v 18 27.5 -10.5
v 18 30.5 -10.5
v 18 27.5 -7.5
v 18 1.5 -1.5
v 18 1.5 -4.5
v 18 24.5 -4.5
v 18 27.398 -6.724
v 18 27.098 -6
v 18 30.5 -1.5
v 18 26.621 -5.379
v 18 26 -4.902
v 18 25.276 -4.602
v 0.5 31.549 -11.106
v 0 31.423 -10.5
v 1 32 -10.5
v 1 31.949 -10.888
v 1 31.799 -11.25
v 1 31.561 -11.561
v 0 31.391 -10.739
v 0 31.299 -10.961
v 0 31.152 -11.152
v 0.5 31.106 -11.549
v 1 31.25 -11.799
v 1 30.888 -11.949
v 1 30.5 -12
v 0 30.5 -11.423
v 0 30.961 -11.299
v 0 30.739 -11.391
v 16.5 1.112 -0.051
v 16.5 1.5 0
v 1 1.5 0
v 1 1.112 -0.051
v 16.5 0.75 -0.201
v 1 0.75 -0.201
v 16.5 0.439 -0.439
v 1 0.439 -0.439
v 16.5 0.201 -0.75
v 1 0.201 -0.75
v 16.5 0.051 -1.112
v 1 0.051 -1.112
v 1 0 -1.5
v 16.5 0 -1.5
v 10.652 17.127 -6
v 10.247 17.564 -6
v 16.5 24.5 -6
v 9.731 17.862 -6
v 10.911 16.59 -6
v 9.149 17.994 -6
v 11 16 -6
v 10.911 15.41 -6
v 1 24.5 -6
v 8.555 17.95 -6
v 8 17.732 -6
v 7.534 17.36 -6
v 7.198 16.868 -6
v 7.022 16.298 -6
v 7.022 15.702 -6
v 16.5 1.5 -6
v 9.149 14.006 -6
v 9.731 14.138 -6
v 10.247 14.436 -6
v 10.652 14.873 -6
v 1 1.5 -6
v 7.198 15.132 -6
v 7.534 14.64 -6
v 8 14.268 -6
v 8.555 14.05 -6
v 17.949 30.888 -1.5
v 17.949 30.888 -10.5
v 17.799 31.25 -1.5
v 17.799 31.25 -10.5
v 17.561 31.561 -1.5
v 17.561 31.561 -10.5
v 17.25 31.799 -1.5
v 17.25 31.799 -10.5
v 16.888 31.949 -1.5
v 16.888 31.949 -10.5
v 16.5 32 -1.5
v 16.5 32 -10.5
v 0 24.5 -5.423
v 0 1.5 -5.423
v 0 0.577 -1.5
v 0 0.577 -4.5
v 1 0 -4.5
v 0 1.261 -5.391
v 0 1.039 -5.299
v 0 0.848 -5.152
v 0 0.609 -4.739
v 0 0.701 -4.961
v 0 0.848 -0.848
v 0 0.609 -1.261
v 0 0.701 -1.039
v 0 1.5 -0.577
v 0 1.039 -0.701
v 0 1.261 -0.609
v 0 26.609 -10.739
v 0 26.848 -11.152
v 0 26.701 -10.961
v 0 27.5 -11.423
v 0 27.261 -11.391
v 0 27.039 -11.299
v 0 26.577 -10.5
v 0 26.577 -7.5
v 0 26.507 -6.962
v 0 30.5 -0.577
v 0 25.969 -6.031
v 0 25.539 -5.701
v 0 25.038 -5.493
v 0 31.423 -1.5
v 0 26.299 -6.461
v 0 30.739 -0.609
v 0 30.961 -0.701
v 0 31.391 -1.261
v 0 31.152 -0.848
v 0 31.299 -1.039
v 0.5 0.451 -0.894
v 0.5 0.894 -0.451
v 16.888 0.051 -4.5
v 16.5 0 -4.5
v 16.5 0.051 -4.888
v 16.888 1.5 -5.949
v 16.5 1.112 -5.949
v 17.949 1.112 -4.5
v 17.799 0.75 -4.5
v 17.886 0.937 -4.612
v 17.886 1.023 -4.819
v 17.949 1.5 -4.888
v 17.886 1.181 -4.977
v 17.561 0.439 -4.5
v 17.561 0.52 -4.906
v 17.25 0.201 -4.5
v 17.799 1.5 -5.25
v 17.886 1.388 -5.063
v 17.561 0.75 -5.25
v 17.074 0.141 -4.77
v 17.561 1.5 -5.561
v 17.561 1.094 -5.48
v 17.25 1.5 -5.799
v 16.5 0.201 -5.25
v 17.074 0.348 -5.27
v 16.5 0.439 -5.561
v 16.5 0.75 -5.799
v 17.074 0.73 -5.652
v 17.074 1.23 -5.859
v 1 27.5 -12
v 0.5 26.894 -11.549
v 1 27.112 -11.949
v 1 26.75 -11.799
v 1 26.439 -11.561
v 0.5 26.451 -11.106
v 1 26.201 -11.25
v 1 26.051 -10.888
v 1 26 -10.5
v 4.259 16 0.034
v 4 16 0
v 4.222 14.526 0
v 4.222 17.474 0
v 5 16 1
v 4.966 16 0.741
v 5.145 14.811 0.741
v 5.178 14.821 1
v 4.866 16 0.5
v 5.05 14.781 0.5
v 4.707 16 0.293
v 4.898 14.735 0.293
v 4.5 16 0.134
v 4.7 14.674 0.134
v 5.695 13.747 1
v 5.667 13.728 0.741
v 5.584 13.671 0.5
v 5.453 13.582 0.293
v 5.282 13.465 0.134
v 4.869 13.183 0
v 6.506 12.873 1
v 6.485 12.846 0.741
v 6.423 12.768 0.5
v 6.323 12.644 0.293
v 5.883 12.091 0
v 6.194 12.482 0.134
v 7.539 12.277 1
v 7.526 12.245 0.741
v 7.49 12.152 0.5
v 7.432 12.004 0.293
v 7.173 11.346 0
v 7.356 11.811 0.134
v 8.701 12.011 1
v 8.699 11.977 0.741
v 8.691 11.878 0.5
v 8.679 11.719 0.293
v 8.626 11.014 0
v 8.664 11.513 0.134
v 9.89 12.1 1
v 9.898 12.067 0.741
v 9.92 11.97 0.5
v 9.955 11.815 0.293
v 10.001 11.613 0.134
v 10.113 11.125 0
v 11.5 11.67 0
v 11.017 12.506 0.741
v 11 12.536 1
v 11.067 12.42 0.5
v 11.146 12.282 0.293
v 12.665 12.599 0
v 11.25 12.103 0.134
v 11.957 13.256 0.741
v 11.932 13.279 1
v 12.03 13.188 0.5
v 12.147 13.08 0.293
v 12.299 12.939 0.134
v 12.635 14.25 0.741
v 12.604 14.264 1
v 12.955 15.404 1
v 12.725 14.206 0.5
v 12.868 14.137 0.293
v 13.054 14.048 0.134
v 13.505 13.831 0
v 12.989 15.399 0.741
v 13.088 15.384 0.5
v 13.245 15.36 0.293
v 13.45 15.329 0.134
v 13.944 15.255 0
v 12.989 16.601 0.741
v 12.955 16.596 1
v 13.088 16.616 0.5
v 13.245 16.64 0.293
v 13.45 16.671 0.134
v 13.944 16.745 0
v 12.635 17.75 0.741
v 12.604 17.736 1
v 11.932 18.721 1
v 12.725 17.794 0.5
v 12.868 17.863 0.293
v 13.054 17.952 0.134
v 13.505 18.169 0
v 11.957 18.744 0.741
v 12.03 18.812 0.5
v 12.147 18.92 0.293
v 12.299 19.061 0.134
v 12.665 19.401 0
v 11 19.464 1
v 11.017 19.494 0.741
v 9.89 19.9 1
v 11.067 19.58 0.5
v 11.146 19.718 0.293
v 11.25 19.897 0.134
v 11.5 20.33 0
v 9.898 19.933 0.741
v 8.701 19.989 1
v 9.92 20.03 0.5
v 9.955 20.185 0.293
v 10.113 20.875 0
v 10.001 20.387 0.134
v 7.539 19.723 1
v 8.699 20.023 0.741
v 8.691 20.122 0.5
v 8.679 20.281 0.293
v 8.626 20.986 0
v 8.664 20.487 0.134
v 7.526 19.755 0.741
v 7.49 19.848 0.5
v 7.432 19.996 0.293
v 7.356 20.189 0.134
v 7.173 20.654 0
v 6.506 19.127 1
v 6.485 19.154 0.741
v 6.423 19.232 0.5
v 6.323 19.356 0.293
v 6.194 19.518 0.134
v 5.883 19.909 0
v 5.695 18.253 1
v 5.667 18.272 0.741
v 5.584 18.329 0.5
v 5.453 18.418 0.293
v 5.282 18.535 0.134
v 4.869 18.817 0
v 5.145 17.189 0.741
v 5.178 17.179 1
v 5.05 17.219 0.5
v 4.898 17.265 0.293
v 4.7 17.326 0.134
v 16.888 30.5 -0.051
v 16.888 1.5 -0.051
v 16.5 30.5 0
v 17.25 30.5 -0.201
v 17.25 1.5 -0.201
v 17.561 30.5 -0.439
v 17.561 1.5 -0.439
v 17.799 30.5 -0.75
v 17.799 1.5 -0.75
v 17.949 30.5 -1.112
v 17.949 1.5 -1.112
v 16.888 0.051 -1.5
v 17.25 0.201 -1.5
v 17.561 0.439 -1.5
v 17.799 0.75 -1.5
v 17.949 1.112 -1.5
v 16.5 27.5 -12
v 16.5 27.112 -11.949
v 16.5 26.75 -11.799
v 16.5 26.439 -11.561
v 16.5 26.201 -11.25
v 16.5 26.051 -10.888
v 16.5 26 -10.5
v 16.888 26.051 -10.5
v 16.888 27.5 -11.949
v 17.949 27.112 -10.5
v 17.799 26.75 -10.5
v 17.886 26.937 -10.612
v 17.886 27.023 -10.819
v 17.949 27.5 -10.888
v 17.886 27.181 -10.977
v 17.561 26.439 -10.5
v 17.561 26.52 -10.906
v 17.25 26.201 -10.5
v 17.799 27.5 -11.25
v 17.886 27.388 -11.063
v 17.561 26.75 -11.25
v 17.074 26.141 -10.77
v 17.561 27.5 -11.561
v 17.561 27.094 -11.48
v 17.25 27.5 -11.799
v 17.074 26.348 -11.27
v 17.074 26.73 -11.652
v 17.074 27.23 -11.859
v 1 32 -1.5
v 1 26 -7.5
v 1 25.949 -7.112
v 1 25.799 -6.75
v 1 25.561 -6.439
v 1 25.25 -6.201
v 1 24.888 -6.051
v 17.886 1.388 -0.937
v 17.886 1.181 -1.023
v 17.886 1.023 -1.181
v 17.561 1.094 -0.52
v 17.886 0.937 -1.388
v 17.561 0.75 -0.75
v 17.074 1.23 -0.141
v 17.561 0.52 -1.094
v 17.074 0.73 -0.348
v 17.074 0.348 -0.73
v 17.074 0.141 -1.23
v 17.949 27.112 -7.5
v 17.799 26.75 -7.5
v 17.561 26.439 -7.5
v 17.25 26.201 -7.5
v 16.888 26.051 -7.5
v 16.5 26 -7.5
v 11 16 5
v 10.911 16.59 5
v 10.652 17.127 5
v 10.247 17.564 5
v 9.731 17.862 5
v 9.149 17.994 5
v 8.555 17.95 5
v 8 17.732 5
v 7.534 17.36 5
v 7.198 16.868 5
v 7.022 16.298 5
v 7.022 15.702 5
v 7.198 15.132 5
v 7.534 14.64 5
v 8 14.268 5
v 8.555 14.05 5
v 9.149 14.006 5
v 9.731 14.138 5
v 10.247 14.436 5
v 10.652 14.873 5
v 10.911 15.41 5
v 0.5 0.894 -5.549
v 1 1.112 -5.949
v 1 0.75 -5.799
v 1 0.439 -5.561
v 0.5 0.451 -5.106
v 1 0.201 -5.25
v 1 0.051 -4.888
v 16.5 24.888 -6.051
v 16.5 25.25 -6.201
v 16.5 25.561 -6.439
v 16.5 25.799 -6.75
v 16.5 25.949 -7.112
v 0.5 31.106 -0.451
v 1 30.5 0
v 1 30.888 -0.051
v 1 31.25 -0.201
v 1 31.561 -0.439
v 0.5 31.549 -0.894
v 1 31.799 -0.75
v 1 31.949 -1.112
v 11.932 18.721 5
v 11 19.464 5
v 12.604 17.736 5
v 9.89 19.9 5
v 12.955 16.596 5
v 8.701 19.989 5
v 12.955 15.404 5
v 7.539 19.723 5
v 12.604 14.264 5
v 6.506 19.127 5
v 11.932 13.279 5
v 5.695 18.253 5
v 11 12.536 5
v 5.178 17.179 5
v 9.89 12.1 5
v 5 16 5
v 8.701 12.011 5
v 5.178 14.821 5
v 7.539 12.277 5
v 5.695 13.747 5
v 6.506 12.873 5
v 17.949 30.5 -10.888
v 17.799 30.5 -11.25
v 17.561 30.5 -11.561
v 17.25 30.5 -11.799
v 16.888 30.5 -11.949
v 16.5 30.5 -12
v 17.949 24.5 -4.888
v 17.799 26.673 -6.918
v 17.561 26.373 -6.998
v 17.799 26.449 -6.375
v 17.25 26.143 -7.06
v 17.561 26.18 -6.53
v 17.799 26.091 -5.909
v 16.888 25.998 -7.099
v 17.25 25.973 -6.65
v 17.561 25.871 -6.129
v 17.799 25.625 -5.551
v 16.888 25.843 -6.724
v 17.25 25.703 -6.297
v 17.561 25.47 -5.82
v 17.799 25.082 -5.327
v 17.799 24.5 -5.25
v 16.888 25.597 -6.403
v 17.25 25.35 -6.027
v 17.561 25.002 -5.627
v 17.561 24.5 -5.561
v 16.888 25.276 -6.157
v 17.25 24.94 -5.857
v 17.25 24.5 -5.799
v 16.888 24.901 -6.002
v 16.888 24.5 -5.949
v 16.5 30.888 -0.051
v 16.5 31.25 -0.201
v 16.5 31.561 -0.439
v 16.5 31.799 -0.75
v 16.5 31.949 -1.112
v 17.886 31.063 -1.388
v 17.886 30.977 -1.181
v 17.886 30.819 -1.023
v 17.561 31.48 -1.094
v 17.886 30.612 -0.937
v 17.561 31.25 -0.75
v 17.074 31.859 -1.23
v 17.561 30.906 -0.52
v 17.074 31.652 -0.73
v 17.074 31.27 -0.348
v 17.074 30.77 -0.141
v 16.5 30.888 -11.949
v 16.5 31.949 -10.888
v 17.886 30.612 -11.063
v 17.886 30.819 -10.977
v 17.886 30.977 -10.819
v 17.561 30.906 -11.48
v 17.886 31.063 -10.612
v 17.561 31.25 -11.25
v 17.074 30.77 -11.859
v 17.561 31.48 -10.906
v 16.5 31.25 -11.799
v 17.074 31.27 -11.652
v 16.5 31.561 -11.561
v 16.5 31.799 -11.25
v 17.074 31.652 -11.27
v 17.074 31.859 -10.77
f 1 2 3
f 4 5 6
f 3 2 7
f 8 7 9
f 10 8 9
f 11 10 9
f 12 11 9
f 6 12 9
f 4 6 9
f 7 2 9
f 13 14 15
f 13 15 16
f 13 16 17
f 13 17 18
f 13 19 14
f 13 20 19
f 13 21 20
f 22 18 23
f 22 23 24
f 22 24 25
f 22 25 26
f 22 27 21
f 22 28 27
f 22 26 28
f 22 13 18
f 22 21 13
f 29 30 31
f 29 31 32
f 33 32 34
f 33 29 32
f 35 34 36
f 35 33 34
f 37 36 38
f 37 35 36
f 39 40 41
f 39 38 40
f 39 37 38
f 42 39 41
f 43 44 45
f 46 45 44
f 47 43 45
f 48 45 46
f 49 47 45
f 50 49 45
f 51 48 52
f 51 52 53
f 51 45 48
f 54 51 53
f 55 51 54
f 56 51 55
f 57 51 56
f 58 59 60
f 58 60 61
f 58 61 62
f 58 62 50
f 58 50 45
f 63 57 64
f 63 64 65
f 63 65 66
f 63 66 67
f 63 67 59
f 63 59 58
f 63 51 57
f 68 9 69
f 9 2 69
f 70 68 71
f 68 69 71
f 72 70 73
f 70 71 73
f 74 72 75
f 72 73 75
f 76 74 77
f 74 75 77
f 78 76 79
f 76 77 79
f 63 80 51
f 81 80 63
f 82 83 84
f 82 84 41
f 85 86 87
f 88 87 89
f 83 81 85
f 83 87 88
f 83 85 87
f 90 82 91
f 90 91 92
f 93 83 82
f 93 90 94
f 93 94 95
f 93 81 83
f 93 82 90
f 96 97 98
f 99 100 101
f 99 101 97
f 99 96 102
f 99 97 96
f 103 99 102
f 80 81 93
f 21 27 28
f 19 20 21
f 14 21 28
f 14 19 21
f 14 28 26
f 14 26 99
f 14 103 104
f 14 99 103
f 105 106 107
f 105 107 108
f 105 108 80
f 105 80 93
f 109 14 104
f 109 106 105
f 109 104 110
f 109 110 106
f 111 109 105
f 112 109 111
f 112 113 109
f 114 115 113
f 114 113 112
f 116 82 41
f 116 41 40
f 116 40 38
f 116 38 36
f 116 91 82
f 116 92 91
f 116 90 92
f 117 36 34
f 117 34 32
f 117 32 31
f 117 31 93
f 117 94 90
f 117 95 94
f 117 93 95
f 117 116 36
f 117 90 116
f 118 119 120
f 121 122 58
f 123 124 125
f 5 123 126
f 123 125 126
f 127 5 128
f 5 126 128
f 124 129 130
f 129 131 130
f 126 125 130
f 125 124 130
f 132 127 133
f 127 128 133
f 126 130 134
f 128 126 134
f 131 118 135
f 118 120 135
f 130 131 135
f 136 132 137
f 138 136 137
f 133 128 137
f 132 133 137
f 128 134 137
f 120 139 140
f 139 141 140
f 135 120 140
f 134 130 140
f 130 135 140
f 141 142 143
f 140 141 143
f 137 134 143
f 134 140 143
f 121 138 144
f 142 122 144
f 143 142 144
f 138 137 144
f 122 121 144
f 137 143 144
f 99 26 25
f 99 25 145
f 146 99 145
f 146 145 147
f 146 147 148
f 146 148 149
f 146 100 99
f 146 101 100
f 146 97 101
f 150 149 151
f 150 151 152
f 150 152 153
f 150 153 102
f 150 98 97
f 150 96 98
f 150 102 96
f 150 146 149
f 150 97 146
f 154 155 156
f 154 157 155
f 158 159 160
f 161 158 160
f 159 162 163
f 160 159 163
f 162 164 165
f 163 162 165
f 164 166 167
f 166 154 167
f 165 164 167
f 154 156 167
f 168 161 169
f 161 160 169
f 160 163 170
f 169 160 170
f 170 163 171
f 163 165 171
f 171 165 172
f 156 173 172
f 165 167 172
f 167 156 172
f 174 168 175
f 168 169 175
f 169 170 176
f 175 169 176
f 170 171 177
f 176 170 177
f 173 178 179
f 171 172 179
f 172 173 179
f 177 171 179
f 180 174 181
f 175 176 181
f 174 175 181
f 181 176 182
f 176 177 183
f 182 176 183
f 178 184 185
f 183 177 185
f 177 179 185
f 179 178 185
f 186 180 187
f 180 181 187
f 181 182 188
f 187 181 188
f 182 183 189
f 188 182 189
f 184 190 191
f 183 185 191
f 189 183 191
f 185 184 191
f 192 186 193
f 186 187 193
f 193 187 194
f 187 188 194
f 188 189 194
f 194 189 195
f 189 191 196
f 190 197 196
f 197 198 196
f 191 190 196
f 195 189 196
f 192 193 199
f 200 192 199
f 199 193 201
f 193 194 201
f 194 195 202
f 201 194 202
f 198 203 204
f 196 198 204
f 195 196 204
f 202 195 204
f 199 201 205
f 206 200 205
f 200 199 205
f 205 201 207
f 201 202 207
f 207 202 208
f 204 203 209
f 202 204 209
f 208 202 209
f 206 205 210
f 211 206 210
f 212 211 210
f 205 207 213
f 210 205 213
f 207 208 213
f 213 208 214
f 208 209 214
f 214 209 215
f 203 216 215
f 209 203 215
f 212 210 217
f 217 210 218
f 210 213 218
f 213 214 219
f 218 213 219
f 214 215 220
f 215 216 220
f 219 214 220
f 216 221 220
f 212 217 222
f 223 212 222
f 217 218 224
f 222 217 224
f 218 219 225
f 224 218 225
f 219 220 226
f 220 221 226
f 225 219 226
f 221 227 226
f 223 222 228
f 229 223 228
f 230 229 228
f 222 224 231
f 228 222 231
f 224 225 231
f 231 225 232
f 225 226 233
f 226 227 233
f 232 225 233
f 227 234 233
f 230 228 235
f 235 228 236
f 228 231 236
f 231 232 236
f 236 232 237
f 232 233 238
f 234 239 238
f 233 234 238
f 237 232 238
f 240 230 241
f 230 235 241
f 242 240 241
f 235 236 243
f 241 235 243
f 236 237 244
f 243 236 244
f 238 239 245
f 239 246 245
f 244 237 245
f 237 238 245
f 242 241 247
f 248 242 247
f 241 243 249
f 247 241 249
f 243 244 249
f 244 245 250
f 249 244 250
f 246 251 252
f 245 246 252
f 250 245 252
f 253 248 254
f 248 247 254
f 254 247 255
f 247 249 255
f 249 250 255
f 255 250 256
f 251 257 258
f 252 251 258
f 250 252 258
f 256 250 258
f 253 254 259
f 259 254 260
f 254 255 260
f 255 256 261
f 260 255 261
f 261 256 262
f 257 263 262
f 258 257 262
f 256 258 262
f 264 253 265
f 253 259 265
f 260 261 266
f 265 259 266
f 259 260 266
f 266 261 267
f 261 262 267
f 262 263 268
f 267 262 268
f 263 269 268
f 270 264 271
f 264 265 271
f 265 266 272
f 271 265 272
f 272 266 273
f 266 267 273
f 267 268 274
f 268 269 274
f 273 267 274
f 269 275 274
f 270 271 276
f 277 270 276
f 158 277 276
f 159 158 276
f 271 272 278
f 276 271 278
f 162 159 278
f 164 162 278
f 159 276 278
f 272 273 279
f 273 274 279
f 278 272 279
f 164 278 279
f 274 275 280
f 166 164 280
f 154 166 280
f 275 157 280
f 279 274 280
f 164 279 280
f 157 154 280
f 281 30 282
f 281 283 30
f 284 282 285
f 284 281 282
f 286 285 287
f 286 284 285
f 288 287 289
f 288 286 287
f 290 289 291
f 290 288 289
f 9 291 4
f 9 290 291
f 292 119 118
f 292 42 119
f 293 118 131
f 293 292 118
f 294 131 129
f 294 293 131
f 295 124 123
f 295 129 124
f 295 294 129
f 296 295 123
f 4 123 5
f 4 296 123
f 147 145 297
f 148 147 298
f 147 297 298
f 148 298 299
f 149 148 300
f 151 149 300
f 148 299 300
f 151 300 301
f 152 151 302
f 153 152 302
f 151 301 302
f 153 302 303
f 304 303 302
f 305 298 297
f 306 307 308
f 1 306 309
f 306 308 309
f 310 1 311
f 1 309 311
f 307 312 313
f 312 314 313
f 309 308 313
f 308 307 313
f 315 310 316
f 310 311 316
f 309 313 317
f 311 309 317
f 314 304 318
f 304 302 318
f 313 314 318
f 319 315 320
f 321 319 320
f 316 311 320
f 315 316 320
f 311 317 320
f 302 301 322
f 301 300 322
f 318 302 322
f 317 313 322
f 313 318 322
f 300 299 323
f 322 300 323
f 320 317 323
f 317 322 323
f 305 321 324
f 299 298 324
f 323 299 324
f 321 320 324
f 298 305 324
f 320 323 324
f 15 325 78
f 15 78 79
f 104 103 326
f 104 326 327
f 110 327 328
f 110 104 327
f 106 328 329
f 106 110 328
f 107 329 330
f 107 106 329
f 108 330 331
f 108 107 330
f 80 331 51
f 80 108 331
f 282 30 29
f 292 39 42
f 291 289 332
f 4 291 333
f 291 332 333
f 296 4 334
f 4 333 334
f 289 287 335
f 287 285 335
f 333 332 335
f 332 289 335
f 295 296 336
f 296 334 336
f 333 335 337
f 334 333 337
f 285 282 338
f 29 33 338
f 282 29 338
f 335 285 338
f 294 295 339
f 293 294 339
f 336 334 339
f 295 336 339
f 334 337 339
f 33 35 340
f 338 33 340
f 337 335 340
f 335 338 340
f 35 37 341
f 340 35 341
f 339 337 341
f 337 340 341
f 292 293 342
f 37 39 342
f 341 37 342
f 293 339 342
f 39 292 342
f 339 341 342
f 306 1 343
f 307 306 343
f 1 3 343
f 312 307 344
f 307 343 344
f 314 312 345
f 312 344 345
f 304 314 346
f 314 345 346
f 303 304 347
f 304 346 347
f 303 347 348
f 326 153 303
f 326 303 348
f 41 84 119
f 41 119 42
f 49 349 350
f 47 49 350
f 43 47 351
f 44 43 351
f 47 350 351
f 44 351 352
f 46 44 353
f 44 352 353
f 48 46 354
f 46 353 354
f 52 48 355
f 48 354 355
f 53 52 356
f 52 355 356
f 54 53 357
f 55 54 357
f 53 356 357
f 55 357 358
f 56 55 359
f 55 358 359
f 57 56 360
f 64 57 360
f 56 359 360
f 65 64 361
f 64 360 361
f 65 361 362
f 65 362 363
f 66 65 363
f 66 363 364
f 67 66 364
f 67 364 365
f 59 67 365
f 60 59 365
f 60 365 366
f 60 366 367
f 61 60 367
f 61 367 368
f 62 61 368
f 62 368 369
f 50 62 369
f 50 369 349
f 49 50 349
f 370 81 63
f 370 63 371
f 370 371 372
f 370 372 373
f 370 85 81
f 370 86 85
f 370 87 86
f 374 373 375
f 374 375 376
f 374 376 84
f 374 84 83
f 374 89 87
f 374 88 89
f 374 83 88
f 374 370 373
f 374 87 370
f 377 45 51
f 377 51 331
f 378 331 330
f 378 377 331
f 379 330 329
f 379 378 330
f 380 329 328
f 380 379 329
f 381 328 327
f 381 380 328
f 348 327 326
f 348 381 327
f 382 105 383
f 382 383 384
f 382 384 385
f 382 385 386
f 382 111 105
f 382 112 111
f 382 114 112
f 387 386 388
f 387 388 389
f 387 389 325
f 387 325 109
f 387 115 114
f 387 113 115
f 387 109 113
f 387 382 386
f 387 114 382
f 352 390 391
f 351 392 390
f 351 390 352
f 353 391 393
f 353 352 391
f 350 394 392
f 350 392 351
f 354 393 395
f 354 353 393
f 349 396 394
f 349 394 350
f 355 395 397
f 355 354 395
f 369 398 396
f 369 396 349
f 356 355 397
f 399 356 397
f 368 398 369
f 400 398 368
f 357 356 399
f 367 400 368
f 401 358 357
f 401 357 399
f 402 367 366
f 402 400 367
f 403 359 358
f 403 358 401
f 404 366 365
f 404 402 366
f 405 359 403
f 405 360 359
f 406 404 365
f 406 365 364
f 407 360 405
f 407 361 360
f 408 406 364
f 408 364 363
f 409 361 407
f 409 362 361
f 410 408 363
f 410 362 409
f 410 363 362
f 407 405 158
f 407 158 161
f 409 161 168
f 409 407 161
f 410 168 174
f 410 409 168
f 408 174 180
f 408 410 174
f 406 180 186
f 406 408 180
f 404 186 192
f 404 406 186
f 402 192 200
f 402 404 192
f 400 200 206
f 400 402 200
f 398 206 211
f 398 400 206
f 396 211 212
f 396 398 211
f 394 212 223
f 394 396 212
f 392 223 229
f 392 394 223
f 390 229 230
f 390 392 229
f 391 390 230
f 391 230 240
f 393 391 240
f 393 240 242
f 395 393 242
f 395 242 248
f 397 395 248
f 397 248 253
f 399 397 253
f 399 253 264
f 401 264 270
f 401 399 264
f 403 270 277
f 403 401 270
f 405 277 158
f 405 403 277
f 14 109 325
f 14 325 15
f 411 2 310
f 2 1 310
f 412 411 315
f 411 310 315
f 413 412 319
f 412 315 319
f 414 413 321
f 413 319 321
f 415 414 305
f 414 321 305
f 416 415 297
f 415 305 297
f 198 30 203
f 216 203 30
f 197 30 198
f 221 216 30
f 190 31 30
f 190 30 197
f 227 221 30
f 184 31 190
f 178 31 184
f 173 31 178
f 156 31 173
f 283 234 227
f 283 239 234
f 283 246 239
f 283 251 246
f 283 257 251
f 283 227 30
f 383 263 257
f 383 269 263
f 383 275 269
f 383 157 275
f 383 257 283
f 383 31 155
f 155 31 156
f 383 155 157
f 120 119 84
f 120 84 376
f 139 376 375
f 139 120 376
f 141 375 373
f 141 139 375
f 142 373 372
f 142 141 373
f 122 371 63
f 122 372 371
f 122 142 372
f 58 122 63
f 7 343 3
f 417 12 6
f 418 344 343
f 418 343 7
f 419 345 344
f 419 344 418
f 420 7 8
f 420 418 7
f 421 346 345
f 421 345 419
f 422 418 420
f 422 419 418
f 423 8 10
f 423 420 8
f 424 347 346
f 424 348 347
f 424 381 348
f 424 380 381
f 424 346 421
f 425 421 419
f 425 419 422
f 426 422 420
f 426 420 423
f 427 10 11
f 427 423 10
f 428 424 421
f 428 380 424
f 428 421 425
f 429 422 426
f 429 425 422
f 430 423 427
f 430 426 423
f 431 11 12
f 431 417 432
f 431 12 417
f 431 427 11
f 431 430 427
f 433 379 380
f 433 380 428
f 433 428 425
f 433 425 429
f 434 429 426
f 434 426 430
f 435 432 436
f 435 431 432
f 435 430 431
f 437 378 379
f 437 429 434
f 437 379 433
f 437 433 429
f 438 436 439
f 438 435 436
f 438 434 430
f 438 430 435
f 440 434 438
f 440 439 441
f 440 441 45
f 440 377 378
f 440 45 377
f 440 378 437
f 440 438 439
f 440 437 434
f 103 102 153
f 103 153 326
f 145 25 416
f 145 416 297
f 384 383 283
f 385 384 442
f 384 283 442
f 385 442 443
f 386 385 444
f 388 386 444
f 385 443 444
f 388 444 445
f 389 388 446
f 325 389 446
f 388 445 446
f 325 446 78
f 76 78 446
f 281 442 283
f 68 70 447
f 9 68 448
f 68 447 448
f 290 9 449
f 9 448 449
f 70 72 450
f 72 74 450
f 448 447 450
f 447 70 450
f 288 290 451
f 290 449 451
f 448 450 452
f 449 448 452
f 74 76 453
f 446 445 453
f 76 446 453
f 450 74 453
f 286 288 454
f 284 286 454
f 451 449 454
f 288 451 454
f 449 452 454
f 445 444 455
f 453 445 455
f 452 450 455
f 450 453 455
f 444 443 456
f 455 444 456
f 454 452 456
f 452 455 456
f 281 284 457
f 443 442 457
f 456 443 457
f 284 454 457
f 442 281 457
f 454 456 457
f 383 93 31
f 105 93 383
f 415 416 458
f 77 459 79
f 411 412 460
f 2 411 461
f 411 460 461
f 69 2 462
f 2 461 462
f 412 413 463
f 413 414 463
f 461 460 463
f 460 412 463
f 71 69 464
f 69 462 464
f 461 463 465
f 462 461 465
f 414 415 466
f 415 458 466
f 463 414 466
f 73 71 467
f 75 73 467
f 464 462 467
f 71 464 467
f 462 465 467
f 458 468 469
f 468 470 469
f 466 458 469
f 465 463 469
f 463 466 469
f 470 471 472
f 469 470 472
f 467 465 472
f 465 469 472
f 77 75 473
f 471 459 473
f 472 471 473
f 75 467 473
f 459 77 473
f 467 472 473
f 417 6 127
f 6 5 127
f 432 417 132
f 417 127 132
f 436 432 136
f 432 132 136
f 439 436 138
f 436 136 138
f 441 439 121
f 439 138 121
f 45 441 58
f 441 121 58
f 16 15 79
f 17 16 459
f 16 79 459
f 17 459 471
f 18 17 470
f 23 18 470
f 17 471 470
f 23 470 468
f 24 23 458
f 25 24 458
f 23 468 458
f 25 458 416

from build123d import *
from OCP.BRepFilletAPI import BRepFilletAPI_MakeChamfer

# Parameters (mm, degrees)
BOSS_EXTRUDE1_DEPTH = 18
SKETCH3_R           = 2
CUT_EXTRUDE1_DEPTH  = 18
FILLET1_R           = 1.5
CHAMFER1_SIZE       = 1
CHAMFER1_SIZE2      = 0.577350269
BOSS_EXTRUDE2_START = 5
SKETCH4_R           = 4
SKETCH4_R_2         = 2
BOSS_EXTRUDE2_DEPTH = 5
FILLET3_R           = 1


with BuildPart() as part:
    # Sketch2 → Boss-Extrude1 (new body)
    with BuildSketch(Plane(origin=(0, 0, 0), x_dir=(0, 0, -1), z_dir=(1, 0, 0))):
        Polygon((0, 0), (0, 32), (12, 32), (12, 26), (6, 26), (6, 0), align=None)
    extrude(amount=BOSS_EXTRUDE1_DEPTH)

    # Sketch3 → Cut-Extrude1 (cut)
    with BuildSketch(Plane.XY):
        with Locations((9, 16)):
            Circle(SKETCH3_R)
    extrude(amount=-CUT_EXTRUDE1_DEPTH, mode=Mode.SUBTRACT)

    # Fillet1
    fillet1_edges = [part.edges().sort_by_distance(p)[0] for p in [
        (9, 0, 0),
        (9, 32, 0),
        (9, 32, -12),
        (9, 26, -12),
        (9, 26, -6),
        (9, 0, -6),
        (18, 26, -9),
        (18, 29, -12),
        (18, 32, -6),
        (18, 16, 0),
        (18, 0, -3),
        (18, 13, -6),
    ]]
    fillet(fillet1_edges, radius=FILLET1_R)

    # Chamfer1: one chamfer whose edges measure the first distance from different faces: ONE call of the kernel's chamfer builder (chamfer() names one face for all edges)
    chamfer1_edges_1 = [part.edges().sort_by_distance(p)[0] for p in [
        (0, 13, -6),
    ]]
    chamfer1_side_1 = [part.faces().sort_by_distance(p)[0] for p in [
        (8.224314761, 12.897259044, -6),
    ]]
    chamfer1_edges_2 = [part.edges().sort_by_distance(p)[0] for p in [
        (0, 16, 0),
    ]]
    chamfer1_side_2 = [part.faces().sort_by_distance(p)[0] for p in [
        (0.333654012, 16, 0),
    ]]
    chamfer1_edges_3 = [part.edges().sort_by_distance(p)[0] for p in [
        (0, 0, -3),
    ]]
    chamfer1_side_3 = [part.faces().sort_by_distance(p)[0] for p in [
        (8.25, 0, -3),
    ]]
    chamfer1_edges_4 = [part.edges().sort_by_distance(p)[0] for p in [
        (0, 32, -6),
    ]]
    chamfer1_side_4 = [part.faces().sort_by_distance(p)[0] for p in [
        (8.25, 32, -6),
    ]]
    chamfer1_edges_5 = [part.edges().sort_by_distance(p)[0] for p in [
        (0, 29, -12),
    ]]
    chamfer1_side_5 = [part.faces().sort_by_distance(p)[0] for p in [
        (8.25, 29, -12),
    ]]
    chamfer1_edges_6 = [part.edges().sort_by_distance(p)[0] for p in [
        (0, 26, -9),
    ]]
    chamfer1_side_6 = [part.faces().sort_by_distance(p)[0] for p in [
        (8.25, 26, -9),
    ]]
    chamfer1_edges_7 = [part.edges().sort_by_distance(p)[0] for p in [
        (0, 31.560660172, -11.560660172),
    ]]
    chamfer1_side_7 = [part.faces().sort_by_distance(p)[0] for p in [
        (8.25, 31.560660172, -11.560660172),
    ]]
    chamfer1_edges_8 = [part.edges().sort_by_distance(p)[0] for p in [
        (0, 26.439339828, -11.560660172),
    ]]
    chamfer1_side_8 = [part.faces().sort_by_distance(p)[0] for p in [
        (8.25, 26.439339828, -11.560660172),
    ]]
    chamfer1_edges_9 = [part.edges().sort_by_distance(p)[0] for p in [
        (0, 0.439339828, -0.439339828),
    ]]
    chamfer1_side_9 = [part.faces().sort_by_distance(p)[0] for p in [
        (8.25, 0.439339828, -0.439339828),
    ]]
    chamfer1_edges_10 = [part.edges().sort_by_distance(p)[0] for p in [
        (0, 0.439339828, -5.560660172),
    ]]
    chamfer1_side_10 = [part.faces().sort_by_distance(p)[0] for p in [
        (8.25, 0.439339828, -5.560660172),
    ]]
    chamfer1_edges_11 = [part.edges().sort_by_distance(p)[0] for p in [
        (0, 31.560660172, -0.439339828),
    ]]
    chamfer1_side_11 = [part.faces().sort_by_distance(p)[0] for p in [
        (8.25, 31.560660172, -0.439339828),
    ]]
    chamfer1_edges_12 = [part.edges().sort_by_distance(p)[0] for p in [
        (0, 25.560660172, -6.439339828),
    ]]
    chamfer1_side_12 = [part.faces().sort_by_distance(p)[0] for p in [
        (8.25, 25.560660172, -6.439339828),
    ]]
    chamfer1 = BRepFilletAPI_MakeChamfer(part.part.solid().wrapped)
    for e in chamfer1_edges_1:
        chamfer1.Add(CHAMFER1_SIZE, CHAMFER1_SIZE2, e.wrapped, chamfer1_side_1[0].wrapped)  # the first distance lies on this face
    for e in chamfer1_edges_2:
        chamfer1.Add(CHAMFER1_SIZE, CHAMFER1_SIZE2, e.wrapped, chamfer1_side_2[0].wrapped)  # the first distance lies on this face
    for e in chamfer1_edges_3:
        chamfer1.Add(CHAMFER1_SIZE, CHAMFER1_SIZE2, e.wrapped, chamfer1_side_3[0].wrapped)  # the first distance lies on this face
    for e in chamfer1_edges_4:
        chamfer1.Add(CHAMFER1_SIZE, CHAMFER1_SIZE2, e.wrapped, chamfer1_side_4[0].wrapped)  # the first distance lies on this face
    for e in chamfer1_edges_5:
        chamfer1.Add(CHAMFER1_SIZE, CHAMFER1_SIZE2, e.wrapped, chamfer1_side_5[0].wrapped)  # the first distance lies on this face
    for e in chamfer1_edges_6:
        chamfer1.Add(CHAMFER1_SIZE, CHAMFER1_SIZE2, e.wrapped, chamfer1_side_6[0].wrapped)  # the first distance lies on this face
    for e in chamfer1_edges_7:
        chamfer1.Add(CHAMFER1_SIZE, CHAMFER1_SIZE2, e.wrapped, chamfer1_side_7[0].wrapped)  # the first distance lies on this face
    for e in chamfer1_edges_8:
        chamfer1.Add(CHAMFER1_SIZE, CHAMFER1_SIZE2, e.wrapped, chamfer1_side_8[0].wrapped)  # the first distance lies on this face
    for e in chamfer1_edges_9:
        chamfer1.Add(CHAMFER1_SIZE, CHAMFER1_SIZE2, e.wrapped, chamfer1_side_9[0].wrapped)  # the first distance lies on this face
    for e in chamfer1_edges_10:
        chamfer1.Add(CHAMFER1_SIZE, CHAMFER1_SIZE2, e.wrapped, chamfer1_side_10[0].wrapped)  # the first distance lies on this face
    for e in chamfer1_edges_11:
        chamfer1.Add(CHAMFER1_SIZE, CHAMFER1_SIZE2, e.wrapped, chamfer1_side_11[0].wrapped)  # the first distance lies on this face
    for e in chamfer1_edges_12:
        chamfer1.Add(CHAMFER1_SIZE, CHAMFER1_SIZE2, e.wrapped, chamfer1_side_12[0].wrapped)  # the first distance lies on this face
    add(Compound.cast(chamfer1.Shape()), mode=Mode.REPLACE)

    # Sketch4 → Boss-Extrude2 (add)
    with BuildSketch(Plane.XY.offset(BOSS_EXTRUDE2_START)):
        with Locations(Location((9, 16, 0), (0, 0, 180))):
            Circle(SKETCH4_R)
        with Locations((9, 16)):
            Circle(SKETCH4_R_2, mode=Mode.SUBTRACT)
    extrude(amount=-BOSS_EXTRUDE2_DEPTH)

    # Fillet3
    fillet3_edges = [part.edges().sort_by_distance(p)[0] for p in [
        (13, 16, 0),
    ]]
    fillet(fillet3_edges, radius=FILLET3_R)


solid = part.part
